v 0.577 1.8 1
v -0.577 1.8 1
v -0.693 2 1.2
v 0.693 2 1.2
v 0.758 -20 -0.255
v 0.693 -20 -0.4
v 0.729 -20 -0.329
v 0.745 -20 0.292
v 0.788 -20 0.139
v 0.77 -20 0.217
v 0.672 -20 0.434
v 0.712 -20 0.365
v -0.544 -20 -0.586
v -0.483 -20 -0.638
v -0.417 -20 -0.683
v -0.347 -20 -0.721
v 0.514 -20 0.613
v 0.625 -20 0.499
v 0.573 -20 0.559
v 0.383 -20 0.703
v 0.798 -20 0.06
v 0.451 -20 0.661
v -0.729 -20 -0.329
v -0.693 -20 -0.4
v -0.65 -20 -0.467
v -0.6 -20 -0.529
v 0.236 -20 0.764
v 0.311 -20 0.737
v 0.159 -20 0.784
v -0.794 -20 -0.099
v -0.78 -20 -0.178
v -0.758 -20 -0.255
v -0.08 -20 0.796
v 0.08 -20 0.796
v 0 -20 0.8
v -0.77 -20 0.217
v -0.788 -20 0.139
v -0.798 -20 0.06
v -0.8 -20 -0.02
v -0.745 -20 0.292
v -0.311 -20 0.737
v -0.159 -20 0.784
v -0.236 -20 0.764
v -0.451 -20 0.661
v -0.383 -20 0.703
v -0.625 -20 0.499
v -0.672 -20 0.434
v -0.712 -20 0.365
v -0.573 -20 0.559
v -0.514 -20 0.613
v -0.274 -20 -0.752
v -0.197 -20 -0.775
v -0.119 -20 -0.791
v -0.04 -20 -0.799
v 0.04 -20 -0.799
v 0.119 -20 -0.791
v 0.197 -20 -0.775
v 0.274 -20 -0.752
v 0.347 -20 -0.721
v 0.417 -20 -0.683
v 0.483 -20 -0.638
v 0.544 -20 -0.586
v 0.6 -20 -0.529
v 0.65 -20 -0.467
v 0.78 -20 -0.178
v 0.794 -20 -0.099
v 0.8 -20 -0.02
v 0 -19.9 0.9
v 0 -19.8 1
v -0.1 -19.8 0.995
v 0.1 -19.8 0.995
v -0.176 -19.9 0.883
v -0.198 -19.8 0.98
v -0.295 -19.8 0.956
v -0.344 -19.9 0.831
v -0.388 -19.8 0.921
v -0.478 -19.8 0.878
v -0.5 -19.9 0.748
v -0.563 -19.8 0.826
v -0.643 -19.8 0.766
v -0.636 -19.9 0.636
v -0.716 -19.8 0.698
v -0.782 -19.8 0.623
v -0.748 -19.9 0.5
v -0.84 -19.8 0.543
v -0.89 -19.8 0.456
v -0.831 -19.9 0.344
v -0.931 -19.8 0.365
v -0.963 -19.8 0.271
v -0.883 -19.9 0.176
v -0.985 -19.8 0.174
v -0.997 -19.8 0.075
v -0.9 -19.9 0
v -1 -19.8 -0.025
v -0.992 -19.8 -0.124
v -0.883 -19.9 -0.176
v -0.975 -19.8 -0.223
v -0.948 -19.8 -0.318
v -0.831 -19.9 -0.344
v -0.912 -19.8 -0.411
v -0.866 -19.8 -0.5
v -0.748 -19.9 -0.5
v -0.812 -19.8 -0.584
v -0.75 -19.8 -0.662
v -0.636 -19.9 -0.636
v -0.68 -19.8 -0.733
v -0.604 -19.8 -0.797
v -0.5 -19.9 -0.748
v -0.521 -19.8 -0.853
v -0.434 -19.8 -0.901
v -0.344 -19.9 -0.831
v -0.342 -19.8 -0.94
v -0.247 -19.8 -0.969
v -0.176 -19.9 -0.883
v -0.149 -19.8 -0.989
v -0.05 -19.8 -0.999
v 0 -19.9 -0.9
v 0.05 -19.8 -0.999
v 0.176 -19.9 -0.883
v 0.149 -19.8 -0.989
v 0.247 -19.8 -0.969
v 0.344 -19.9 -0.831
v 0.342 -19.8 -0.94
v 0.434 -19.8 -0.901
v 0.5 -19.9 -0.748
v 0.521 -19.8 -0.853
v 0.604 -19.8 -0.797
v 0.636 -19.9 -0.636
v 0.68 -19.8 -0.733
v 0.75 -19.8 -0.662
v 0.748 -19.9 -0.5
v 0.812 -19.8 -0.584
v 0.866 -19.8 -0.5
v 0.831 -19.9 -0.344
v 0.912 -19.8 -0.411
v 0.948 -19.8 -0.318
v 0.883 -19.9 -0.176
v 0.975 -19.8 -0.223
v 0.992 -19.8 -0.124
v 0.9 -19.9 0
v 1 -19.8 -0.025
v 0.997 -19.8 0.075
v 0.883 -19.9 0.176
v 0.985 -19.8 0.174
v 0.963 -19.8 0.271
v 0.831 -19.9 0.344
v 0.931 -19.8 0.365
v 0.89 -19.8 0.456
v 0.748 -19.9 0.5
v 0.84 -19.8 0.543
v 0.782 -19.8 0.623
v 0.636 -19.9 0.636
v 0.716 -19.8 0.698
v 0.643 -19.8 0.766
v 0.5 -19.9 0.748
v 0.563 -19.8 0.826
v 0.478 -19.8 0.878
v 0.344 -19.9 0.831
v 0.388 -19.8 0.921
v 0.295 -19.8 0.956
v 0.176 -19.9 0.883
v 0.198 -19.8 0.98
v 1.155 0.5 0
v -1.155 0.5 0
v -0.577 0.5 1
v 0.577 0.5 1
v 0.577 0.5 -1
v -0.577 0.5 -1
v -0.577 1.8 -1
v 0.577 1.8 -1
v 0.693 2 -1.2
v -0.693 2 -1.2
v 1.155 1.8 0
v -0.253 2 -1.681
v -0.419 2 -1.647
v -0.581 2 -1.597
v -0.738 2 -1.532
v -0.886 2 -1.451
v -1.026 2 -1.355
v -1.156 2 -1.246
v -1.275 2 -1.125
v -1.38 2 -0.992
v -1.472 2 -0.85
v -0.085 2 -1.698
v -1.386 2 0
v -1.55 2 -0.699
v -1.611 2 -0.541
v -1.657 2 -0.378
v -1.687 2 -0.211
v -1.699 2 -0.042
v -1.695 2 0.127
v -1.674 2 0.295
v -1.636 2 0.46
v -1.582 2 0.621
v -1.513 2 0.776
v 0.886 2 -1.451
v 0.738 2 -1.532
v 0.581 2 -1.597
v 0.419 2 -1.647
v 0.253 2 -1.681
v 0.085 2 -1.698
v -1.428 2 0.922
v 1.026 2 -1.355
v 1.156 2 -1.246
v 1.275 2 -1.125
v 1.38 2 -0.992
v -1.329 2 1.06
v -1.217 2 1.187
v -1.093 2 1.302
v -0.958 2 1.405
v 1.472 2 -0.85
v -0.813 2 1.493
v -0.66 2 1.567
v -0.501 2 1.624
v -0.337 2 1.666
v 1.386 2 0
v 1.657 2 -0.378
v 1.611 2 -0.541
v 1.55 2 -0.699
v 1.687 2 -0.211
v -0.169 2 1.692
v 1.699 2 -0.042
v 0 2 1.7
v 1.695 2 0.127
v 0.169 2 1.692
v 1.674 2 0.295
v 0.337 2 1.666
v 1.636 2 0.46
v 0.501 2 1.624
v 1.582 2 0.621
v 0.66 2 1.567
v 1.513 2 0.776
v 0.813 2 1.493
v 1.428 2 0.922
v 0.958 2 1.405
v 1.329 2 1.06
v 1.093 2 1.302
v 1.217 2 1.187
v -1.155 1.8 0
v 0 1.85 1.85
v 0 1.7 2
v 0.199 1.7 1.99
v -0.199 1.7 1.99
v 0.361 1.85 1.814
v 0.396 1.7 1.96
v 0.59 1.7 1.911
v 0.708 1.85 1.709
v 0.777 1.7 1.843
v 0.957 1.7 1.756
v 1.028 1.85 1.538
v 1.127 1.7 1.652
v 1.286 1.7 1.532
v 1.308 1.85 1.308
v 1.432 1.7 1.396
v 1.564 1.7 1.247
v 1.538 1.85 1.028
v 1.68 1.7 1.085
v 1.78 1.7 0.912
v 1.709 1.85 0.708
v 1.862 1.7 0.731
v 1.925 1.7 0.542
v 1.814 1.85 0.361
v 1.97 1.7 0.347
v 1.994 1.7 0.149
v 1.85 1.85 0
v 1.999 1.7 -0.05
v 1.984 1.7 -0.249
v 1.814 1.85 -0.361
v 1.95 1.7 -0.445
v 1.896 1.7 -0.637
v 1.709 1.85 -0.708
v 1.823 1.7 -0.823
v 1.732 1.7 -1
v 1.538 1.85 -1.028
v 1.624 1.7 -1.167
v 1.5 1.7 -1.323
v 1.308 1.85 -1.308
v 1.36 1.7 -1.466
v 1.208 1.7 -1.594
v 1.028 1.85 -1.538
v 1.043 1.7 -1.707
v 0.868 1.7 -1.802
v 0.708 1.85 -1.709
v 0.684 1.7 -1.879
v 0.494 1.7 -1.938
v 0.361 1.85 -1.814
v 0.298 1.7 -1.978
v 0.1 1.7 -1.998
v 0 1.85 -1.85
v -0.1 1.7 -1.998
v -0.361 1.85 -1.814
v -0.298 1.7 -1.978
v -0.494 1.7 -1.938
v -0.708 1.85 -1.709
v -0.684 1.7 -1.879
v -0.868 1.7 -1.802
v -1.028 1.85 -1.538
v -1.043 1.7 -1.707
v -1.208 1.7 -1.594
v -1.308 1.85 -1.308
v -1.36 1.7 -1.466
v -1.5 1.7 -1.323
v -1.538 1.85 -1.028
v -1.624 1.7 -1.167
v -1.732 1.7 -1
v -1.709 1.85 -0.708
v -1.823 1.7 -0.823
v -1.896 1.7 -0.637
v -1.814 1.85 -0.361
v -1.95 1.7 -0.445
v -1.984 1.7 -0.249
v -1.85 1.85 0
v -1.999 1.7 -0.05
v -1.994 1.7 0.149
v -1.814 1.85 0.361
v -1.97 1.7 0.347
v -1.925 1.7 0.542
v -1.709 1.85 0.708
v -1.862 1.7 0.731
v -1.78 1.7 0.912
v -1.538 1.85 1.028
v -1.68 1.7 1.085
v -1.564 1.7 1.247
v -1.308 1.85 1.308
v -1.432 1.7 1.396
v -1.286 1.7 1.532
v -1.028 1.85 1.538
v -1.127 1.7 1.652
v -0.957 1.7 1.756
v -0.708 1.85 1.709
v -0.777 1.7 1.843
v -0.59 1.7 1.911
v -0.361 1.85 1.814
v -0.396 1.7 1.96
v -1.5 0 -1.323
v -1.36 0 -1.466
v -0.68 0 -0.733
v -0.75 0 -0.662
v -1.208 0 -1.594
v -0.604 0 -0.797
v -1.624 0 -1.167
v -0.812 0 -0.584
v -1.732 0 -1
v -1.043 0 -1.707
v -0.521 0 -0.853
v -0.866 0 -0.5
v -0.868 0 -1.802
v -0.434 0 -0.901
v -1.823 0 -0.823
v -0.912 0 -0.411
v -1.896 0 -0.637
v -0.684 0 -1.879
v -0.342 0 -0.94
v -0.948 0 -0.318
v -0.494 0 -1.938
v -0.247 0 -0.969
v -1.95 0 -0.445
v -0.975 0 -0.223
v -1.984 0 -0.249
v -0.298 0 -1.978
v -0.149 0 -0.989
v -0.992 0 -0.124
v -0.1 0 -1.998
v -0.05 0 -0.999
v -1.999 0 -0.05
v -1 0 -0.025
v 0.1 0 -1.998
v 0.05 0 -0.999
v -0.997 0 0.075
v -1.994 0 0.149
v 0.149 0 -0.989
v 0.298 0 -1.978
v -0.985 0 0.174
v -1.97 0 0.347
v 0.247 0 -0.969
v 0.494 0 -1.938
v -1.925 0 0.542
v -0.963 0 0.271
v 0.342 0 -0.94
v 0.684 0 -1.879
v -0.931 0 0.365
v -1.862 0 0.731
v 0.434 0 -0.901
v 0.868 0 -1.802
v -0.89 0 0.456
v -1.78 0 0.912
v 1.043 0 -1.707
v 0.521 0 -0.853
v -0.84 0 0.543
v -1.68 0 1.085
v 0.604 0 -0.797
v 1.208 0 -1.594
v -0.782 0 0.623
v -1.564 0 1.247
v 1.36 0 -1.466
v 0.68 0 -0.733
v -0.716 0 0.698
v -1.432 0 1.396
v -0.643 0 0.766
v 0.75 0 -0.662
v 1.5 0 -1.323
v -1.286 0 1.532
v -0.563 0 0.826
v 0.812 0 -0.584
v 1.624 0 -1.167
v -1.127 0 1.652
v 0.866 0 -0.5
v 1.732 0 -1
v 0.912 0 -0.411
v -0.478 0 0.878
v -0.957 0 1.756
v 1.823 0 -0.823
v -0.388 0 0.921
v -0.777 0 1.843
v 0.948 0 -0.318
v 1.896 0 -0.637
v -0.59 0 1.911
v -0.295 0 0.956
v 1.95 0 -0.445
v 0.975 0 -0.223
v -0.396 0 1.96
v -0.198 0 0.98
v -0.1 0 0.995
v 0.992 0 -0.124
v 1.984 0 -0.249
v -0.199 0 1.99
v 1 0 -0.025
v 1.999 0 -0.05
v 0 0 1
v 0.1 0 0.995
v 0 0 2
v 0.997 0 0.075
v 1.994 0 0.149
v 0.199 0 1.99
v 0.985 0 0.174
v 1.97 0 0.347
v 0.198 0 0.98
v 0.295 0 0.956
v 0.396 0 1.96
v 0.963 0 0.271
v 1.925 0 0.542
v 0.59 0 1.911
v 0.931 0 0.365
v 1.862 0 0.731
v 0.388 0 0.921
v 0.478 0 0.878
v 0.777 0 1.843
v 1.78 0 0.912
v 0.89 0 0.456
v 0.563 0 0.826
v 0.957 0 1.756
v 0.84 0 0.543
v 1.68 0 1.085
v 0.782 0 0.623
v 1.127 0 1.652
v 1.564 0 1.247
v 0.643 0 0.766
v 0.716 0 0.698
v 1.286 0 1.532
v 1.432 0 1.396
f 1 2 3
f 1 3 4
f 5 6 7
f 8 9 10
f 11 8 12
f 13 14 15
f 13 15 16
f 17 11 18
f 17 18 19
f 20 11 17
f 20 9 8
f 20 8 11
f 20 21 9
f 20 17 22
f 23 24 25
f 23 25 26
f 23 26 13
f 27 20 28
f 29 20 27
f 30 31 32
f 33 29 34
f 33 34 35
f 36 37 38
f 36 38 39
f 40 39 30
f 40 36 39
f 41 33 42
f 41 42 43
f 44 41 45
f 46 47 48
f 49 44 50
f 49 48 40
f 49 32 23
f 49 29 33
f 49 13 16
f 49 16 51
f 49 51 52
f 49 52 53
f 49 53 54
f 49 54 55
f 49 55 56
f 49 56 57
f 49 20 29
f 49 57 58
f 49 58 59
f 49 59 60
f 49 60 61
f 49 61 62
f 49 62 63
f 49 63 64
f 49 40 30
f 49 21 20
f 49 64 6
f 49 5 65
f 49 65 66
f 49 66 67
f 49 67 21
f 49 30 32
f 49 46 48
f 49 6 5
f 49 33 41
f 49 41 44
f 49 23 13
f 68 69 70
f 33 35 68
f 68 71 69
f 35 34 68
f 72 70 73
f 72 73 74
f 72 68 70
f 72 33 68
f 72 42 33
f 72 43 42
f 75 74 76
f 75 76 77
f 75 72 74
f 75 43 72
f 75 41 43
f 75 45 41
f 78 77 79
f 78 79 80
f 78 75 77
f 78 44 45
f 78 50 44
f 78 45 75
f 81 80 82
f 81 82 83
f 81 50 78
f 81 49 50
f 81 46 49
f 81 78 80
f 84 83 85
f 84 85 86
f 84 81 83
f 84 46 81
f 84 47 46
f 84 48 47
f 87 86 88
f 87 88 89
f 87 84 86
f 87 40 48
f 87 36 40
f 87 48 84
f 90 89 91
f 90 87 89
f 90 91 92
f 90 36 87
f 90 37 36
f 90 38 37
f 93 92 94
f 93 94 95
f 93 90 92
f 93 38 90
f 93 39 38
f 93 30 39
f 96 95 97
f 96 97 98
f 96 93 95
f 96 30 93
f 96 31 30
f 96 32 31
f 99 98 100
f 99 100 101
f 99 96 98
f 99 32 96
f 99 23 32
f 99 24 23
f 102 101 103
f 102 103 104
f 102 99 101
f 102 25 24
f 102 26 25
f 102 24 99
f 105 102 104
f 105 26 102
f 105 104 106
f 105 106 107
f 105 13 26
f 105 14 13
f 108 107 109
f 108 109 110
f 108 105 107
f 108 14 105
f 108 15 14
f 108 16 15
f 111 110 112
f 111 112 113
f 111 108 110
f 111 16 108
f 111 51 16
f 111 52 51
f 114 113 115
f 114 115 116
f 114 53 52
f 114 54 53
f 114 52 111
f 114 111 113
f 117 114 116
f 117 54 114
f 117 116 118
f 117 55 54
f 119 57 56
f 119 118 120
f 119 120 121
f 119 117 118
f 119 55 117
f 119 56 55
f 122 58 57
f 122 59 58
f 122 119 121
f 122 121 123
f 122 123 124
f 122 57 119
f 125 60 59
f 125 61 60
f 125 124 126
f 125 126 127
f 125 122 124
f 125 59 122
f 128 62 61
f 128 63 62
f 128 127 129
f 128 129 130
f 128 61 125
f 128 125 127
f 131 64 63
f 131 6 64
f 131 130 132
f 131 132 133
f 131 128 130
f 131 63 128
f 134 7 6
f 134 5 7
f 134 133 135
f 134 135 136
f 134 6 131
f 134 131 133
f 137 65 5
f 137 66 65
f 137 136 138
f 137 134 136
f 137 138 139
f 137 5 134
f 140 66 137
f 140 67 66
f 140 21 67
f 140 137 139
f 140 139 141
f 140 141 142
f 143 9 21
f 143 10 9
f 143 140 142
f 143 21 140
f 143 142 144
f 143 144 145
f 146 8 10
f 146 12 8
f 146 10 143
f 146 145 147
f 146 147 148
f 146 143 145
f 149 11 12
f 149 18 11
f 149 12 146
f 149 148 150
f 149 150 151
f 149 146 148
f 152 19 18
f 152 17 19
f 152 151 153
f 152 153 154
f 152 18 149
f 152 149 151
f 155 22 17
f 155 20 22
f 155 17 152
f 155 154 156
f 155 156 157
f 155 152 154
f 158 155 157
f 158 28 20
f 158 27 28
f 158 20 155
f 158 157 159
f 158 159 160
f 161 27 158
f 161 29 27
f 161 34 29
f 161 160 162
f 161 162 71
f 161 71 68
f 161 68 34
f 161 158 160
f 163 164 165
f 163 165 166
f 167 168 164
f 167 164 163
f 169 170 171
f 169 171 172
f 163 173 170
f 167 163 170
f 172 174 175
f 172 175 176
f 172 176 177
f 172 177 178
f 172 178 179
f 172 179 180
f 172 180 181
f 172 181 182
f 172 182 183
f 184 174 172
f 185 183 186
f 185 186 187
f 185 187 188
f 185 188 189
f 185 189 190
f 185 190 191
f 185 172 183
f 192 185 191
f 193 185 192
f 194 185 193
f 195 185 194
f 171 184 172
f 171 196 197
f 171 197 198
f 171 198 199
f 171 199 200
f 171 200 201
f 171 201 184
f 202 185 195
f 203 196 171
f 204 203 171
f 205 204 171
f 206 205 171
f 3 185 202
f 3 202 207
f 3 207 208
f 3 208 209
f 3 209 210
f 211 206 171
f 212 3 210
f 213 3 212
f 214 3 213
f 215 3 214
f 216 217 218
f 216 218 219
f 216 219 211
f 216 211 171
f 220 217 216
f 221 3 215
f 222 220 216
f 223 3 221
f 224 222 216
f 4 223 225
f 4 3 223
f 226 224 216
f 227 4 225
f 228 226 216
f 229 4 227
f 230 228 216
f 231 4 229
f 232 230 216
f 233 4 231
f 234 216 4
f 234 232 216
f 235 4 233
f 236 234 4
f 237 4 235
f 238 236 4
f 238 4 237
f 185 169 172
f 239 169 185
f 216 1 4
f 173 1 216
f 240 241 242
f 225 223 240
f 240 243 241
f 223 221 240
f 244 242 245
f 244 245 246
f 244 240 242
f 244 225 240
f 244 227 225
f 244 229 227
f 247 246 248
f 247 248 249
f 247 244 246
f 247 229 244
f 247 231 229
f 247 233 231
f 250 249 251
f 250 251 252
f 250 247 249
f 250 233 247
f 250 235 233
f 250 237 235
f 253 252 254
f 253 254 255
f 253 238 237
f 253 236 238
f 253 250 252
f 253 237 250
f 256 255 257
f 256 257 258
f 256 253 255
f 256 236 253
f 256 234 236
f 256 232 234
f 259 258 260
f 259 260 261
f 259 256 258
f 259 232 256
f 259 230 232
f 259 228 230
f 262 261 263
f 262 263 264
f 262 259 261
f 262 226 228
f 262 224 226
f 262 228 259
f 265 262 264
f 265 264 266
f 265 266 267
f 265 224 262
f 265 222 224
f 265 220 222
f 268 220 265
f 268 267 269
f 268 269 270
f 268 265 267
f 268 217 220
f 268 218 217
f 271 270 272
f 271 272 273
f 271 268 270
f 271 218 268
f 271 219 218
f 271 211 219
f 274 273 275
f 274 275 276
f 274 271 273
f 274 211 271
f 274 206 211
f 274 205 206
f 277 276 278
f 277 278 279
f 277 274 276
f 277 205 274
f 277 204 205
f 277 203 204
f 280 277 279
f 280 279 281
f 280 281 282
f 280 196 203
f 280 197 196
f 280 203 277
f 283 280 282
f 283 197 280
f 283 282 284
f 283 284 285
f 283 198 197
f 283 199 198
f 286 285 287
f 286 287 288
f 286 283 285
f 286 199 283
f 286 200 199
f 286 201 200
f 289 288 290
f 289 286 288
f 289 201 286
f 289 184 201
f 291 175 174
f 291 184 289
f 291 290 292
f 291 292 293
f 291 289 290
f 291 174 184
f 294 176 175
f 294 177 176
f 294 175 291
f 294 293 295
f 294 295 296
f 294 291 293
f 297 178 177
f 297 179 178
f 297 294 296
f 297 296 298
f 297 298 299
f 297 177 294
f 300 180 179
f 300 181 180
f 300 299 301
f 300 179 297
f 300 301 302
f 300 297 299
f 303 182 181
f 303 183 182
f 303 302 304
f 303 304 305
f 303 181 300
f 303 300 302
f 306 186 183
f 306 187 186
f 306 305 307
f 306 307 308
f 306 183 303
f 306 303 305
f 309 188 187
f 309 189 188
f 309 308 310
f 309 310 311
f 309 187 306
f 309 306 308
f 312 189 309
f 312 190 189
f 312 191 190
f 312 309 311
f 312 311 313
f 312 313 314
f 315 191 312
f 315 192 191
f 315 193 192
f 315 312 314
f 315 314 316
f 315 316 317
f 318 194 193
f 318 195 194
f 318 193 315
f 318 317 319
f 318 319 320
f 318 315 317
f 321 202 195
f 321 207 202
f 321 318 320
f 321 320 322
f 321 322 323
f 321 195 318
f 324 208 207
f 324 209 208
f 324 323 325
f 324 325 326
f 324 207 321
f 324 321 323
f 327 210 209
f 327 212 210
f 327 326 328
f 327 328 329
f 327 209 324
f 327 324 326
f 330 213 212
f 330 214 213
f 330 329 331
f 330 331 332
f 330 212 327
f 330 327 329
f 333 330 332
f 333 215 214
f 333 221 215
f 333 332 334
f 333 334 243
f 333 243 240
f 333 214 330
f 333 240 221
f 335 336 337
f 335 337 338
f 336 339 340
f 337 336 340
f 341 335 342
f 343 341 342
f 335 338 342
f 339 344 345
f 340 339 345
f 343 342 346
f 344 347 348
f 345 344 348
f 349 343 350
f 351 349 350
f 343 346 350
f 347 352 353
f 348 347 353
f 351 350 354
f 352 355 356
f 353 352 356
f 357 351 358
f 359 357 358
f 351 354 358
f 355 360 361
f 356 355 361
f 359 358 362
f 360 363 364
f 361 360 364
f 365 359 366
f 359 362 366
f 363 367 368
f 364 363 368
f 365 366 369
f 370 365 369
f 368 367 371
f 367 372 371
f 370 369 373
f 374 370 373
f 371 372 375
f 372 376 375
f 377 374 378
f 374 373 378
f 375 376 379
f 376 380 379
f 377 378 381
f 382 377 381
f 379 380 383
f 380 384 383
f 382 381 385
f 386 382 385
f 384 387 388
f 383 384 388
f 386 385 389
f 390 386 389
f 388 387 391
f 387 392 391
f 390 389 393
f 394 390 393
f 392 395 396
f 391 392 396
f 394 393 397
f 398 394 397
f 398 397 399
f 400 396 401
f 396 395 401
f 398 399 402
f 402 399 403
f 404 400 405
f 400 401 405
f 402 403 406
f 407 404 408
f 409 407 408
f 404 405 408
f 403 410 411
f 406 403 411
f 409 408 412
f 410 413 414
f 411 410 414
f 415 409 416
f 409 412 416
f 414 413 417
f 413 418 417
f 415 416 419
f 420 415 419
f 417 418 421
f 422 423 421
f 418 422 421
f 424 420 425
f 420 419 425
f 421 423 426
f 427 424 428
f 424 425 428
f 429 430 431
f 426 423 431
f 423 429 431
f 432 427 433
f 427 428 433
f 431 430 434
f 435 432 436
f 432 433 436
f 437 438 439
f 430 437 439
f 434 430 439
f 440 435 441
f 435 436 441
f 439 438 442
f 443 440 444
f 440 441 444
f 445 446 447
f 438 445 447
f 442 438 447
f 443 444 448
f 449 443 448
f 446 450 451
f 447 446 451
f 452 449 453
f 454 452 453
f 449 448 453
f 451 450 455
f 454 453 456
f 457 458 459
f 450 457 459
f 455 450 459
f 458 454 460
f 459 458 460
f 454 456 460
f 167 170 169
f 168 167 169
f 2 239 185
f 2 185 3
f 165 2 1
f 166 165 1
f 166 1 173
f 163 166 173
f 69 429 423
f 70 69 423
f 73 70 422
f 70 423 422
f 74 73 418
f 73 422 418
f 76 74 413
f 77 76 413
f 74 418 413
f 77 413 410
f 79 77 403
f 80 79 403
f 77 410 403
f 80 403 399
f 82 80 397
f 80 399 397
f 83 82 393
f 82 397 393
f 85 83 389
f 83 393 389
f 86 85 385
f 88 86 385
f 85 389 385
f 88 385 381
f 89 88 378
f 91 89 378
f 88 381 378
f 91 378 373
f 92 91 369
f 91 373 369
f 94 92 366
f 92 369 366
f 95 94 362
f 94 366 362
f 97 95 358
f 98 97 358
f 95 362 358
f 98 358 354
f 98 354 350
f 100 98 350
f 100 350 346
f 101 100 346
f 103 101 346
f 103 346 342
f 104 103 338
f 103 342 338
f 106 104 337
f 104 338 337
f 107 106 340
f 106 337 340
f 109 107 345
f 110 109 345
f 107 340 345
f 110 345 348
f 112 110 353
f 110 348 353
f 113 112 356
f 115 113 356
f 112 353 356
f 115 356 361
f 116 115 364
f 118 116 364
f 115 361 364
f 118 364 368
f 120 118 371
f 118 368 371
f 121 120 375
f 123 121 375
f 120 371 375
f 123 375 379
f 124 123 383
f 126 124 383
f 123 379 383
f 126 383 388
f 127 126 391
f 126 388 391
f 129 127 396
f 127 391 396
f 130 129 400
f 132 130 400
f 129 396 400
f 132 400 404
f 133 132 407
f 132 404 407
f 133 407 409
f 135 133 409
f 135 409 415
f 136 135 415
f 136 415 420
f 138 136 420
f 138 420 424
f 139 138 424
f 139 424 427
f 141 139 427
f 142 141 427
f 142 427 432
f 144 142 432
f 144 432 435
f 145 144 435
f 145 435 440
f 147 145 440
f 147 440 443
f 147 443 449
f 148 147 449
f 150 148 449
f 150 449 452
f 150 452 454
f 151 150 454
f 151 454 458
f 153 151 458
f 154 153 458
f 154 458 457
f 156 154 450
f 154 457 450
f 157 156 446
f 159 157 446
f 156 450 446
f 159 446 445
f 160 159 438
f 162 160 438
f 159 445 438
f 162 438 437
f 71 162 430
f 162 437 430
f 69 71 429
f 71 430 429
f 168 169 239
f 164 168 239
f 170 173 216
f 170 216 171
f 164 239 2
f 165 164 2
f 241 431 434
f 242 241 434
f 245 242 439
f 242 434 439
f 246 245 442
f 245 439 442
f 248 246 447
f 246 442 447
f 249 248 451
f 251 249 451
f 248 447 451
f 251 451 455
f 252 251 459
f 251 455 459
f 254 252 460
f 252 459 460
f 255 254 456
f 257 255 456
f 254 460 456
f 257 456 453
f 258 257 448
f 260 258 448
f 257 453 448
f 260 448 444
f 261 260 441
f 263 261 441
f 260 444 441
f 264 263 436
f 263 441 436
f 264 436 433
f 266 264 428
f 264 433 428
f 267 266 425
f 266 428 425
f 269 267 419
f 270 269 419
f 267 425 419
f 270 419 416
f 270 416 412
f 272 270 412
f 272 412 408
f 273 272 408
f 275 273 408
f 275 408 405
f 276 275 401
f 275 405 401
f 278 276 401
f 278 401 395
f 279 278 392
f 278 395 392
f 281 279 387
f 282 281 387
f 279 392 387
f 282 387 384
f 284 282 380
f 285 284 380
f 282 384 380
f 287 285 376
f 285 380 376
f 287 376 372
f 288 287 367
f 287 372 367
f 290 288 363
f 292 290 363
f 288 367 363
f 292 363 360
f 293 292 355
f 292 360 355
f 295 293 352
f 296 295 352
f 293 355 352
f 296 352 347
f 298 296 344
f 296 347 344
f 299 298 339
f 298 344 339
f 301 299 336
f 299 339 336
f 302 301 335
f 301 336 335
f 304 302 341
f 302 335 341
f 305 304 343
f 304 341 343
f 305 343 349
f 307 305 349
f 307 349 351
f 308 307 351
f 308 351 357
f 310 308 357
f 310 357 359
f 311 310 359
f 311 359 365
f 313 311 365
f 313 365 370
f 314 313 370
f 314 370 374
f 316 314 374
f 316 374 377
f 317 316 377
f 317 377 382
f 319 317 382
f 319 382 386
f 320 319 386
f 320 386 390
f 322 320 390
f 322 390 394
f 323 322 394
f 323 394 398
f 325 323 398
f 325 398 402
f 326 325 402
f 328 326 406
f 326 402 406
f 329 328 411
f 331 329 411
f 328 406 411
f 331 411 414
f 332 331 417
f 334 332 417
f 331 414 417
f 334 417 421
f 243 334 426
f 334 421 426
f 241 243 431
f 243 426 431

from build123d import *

# Parameters (mm, degrees)
SKETCH1_R           = 2
BOSS_EXTRUDE1_DEPTH = 2
CHAMFER1_SIZE       = 0.3
CUT_EXTRUDE1_DEPTH  = 1.5
CHAMFER2_SIZE       = 0.2
SKETCH3_R           = 1
BOSS_EXTRUDE2_DEPTH = 20
CHAMFER3_SIZE       = 0.2


with BuildPart() as part:
    # Sketch1 → Boss-Extrude1 (new body)
    with BuildSketch(Plane(origin=(0, 0, 0), x_dir=(1, 0, 0), z_dir=(0, 1, 0))):
        with Locations(Location((0, 0, 0), (0, 0, 270))):  # turned: the seam where the file's is
            Circle(SKETCH1_R)
    extrude(amount=BOSS_EXTRUDE1_DEPTH)

    # Chamfer1
    chamfer1_edges = [part.edges().sort_by_distance(p)[0] for p in [
        (0, 2, -2),
    ]]
    chamfer(chamfer1_edges, length=CHAMFER1_SIZE)

    # Sketch2 → Cut-Extrude1 (cut)
    with BuildSketch(Plane(origin=(0, 2, 0), x_dir=(1, 0, 0), z_dir=(0, 1, 0))):
        Polygon((1.154700538, 0), (0.577350269, 1), (-0.577350269, 1), (-1.154700538, 0), (-0.577350269, -1), (0.577350269, -1), align=None)
    extrude(amount=-CUT_EXTRUDE1_DEPTH, mode=Mode.SUBTRACT)

    # Chamfer2
    chamfer2_edges = [part.edges().sort_by_distance(p)[0] for p in [
        (0.866025404, 2, 0.5),
        (0.866025404, 2, -0.5),
        (0, 2, -1),
        (-0.866025404, 2, -0.5),
        (-0.866025404, 2, 0.5),
        (0, 2, 1),
    ]]
    chamfer(chamfer2_edges, length=CHAMFER2_SIZE)

    # Sketch3 → Boss-Extrude2 (add)
    with BuildSketch(Plane.XZ):
        with Locations(Location((0, 0, 0), (0, 0, 90))):  # turned: the seam where the file's is
            Circle(SKETCH3_R)
    extrude(amount=BOSS_EXTRUDE2_DEPTH)

    # Chamfer3
    chamfer3_edges = [part.edges().sort_by_distance(p)[0] for p in [
        (0, -20, -1),
    ]]
    chamfer(chamfer3_edges, length=CHAMFER3_SIZE)


solid = part.part
